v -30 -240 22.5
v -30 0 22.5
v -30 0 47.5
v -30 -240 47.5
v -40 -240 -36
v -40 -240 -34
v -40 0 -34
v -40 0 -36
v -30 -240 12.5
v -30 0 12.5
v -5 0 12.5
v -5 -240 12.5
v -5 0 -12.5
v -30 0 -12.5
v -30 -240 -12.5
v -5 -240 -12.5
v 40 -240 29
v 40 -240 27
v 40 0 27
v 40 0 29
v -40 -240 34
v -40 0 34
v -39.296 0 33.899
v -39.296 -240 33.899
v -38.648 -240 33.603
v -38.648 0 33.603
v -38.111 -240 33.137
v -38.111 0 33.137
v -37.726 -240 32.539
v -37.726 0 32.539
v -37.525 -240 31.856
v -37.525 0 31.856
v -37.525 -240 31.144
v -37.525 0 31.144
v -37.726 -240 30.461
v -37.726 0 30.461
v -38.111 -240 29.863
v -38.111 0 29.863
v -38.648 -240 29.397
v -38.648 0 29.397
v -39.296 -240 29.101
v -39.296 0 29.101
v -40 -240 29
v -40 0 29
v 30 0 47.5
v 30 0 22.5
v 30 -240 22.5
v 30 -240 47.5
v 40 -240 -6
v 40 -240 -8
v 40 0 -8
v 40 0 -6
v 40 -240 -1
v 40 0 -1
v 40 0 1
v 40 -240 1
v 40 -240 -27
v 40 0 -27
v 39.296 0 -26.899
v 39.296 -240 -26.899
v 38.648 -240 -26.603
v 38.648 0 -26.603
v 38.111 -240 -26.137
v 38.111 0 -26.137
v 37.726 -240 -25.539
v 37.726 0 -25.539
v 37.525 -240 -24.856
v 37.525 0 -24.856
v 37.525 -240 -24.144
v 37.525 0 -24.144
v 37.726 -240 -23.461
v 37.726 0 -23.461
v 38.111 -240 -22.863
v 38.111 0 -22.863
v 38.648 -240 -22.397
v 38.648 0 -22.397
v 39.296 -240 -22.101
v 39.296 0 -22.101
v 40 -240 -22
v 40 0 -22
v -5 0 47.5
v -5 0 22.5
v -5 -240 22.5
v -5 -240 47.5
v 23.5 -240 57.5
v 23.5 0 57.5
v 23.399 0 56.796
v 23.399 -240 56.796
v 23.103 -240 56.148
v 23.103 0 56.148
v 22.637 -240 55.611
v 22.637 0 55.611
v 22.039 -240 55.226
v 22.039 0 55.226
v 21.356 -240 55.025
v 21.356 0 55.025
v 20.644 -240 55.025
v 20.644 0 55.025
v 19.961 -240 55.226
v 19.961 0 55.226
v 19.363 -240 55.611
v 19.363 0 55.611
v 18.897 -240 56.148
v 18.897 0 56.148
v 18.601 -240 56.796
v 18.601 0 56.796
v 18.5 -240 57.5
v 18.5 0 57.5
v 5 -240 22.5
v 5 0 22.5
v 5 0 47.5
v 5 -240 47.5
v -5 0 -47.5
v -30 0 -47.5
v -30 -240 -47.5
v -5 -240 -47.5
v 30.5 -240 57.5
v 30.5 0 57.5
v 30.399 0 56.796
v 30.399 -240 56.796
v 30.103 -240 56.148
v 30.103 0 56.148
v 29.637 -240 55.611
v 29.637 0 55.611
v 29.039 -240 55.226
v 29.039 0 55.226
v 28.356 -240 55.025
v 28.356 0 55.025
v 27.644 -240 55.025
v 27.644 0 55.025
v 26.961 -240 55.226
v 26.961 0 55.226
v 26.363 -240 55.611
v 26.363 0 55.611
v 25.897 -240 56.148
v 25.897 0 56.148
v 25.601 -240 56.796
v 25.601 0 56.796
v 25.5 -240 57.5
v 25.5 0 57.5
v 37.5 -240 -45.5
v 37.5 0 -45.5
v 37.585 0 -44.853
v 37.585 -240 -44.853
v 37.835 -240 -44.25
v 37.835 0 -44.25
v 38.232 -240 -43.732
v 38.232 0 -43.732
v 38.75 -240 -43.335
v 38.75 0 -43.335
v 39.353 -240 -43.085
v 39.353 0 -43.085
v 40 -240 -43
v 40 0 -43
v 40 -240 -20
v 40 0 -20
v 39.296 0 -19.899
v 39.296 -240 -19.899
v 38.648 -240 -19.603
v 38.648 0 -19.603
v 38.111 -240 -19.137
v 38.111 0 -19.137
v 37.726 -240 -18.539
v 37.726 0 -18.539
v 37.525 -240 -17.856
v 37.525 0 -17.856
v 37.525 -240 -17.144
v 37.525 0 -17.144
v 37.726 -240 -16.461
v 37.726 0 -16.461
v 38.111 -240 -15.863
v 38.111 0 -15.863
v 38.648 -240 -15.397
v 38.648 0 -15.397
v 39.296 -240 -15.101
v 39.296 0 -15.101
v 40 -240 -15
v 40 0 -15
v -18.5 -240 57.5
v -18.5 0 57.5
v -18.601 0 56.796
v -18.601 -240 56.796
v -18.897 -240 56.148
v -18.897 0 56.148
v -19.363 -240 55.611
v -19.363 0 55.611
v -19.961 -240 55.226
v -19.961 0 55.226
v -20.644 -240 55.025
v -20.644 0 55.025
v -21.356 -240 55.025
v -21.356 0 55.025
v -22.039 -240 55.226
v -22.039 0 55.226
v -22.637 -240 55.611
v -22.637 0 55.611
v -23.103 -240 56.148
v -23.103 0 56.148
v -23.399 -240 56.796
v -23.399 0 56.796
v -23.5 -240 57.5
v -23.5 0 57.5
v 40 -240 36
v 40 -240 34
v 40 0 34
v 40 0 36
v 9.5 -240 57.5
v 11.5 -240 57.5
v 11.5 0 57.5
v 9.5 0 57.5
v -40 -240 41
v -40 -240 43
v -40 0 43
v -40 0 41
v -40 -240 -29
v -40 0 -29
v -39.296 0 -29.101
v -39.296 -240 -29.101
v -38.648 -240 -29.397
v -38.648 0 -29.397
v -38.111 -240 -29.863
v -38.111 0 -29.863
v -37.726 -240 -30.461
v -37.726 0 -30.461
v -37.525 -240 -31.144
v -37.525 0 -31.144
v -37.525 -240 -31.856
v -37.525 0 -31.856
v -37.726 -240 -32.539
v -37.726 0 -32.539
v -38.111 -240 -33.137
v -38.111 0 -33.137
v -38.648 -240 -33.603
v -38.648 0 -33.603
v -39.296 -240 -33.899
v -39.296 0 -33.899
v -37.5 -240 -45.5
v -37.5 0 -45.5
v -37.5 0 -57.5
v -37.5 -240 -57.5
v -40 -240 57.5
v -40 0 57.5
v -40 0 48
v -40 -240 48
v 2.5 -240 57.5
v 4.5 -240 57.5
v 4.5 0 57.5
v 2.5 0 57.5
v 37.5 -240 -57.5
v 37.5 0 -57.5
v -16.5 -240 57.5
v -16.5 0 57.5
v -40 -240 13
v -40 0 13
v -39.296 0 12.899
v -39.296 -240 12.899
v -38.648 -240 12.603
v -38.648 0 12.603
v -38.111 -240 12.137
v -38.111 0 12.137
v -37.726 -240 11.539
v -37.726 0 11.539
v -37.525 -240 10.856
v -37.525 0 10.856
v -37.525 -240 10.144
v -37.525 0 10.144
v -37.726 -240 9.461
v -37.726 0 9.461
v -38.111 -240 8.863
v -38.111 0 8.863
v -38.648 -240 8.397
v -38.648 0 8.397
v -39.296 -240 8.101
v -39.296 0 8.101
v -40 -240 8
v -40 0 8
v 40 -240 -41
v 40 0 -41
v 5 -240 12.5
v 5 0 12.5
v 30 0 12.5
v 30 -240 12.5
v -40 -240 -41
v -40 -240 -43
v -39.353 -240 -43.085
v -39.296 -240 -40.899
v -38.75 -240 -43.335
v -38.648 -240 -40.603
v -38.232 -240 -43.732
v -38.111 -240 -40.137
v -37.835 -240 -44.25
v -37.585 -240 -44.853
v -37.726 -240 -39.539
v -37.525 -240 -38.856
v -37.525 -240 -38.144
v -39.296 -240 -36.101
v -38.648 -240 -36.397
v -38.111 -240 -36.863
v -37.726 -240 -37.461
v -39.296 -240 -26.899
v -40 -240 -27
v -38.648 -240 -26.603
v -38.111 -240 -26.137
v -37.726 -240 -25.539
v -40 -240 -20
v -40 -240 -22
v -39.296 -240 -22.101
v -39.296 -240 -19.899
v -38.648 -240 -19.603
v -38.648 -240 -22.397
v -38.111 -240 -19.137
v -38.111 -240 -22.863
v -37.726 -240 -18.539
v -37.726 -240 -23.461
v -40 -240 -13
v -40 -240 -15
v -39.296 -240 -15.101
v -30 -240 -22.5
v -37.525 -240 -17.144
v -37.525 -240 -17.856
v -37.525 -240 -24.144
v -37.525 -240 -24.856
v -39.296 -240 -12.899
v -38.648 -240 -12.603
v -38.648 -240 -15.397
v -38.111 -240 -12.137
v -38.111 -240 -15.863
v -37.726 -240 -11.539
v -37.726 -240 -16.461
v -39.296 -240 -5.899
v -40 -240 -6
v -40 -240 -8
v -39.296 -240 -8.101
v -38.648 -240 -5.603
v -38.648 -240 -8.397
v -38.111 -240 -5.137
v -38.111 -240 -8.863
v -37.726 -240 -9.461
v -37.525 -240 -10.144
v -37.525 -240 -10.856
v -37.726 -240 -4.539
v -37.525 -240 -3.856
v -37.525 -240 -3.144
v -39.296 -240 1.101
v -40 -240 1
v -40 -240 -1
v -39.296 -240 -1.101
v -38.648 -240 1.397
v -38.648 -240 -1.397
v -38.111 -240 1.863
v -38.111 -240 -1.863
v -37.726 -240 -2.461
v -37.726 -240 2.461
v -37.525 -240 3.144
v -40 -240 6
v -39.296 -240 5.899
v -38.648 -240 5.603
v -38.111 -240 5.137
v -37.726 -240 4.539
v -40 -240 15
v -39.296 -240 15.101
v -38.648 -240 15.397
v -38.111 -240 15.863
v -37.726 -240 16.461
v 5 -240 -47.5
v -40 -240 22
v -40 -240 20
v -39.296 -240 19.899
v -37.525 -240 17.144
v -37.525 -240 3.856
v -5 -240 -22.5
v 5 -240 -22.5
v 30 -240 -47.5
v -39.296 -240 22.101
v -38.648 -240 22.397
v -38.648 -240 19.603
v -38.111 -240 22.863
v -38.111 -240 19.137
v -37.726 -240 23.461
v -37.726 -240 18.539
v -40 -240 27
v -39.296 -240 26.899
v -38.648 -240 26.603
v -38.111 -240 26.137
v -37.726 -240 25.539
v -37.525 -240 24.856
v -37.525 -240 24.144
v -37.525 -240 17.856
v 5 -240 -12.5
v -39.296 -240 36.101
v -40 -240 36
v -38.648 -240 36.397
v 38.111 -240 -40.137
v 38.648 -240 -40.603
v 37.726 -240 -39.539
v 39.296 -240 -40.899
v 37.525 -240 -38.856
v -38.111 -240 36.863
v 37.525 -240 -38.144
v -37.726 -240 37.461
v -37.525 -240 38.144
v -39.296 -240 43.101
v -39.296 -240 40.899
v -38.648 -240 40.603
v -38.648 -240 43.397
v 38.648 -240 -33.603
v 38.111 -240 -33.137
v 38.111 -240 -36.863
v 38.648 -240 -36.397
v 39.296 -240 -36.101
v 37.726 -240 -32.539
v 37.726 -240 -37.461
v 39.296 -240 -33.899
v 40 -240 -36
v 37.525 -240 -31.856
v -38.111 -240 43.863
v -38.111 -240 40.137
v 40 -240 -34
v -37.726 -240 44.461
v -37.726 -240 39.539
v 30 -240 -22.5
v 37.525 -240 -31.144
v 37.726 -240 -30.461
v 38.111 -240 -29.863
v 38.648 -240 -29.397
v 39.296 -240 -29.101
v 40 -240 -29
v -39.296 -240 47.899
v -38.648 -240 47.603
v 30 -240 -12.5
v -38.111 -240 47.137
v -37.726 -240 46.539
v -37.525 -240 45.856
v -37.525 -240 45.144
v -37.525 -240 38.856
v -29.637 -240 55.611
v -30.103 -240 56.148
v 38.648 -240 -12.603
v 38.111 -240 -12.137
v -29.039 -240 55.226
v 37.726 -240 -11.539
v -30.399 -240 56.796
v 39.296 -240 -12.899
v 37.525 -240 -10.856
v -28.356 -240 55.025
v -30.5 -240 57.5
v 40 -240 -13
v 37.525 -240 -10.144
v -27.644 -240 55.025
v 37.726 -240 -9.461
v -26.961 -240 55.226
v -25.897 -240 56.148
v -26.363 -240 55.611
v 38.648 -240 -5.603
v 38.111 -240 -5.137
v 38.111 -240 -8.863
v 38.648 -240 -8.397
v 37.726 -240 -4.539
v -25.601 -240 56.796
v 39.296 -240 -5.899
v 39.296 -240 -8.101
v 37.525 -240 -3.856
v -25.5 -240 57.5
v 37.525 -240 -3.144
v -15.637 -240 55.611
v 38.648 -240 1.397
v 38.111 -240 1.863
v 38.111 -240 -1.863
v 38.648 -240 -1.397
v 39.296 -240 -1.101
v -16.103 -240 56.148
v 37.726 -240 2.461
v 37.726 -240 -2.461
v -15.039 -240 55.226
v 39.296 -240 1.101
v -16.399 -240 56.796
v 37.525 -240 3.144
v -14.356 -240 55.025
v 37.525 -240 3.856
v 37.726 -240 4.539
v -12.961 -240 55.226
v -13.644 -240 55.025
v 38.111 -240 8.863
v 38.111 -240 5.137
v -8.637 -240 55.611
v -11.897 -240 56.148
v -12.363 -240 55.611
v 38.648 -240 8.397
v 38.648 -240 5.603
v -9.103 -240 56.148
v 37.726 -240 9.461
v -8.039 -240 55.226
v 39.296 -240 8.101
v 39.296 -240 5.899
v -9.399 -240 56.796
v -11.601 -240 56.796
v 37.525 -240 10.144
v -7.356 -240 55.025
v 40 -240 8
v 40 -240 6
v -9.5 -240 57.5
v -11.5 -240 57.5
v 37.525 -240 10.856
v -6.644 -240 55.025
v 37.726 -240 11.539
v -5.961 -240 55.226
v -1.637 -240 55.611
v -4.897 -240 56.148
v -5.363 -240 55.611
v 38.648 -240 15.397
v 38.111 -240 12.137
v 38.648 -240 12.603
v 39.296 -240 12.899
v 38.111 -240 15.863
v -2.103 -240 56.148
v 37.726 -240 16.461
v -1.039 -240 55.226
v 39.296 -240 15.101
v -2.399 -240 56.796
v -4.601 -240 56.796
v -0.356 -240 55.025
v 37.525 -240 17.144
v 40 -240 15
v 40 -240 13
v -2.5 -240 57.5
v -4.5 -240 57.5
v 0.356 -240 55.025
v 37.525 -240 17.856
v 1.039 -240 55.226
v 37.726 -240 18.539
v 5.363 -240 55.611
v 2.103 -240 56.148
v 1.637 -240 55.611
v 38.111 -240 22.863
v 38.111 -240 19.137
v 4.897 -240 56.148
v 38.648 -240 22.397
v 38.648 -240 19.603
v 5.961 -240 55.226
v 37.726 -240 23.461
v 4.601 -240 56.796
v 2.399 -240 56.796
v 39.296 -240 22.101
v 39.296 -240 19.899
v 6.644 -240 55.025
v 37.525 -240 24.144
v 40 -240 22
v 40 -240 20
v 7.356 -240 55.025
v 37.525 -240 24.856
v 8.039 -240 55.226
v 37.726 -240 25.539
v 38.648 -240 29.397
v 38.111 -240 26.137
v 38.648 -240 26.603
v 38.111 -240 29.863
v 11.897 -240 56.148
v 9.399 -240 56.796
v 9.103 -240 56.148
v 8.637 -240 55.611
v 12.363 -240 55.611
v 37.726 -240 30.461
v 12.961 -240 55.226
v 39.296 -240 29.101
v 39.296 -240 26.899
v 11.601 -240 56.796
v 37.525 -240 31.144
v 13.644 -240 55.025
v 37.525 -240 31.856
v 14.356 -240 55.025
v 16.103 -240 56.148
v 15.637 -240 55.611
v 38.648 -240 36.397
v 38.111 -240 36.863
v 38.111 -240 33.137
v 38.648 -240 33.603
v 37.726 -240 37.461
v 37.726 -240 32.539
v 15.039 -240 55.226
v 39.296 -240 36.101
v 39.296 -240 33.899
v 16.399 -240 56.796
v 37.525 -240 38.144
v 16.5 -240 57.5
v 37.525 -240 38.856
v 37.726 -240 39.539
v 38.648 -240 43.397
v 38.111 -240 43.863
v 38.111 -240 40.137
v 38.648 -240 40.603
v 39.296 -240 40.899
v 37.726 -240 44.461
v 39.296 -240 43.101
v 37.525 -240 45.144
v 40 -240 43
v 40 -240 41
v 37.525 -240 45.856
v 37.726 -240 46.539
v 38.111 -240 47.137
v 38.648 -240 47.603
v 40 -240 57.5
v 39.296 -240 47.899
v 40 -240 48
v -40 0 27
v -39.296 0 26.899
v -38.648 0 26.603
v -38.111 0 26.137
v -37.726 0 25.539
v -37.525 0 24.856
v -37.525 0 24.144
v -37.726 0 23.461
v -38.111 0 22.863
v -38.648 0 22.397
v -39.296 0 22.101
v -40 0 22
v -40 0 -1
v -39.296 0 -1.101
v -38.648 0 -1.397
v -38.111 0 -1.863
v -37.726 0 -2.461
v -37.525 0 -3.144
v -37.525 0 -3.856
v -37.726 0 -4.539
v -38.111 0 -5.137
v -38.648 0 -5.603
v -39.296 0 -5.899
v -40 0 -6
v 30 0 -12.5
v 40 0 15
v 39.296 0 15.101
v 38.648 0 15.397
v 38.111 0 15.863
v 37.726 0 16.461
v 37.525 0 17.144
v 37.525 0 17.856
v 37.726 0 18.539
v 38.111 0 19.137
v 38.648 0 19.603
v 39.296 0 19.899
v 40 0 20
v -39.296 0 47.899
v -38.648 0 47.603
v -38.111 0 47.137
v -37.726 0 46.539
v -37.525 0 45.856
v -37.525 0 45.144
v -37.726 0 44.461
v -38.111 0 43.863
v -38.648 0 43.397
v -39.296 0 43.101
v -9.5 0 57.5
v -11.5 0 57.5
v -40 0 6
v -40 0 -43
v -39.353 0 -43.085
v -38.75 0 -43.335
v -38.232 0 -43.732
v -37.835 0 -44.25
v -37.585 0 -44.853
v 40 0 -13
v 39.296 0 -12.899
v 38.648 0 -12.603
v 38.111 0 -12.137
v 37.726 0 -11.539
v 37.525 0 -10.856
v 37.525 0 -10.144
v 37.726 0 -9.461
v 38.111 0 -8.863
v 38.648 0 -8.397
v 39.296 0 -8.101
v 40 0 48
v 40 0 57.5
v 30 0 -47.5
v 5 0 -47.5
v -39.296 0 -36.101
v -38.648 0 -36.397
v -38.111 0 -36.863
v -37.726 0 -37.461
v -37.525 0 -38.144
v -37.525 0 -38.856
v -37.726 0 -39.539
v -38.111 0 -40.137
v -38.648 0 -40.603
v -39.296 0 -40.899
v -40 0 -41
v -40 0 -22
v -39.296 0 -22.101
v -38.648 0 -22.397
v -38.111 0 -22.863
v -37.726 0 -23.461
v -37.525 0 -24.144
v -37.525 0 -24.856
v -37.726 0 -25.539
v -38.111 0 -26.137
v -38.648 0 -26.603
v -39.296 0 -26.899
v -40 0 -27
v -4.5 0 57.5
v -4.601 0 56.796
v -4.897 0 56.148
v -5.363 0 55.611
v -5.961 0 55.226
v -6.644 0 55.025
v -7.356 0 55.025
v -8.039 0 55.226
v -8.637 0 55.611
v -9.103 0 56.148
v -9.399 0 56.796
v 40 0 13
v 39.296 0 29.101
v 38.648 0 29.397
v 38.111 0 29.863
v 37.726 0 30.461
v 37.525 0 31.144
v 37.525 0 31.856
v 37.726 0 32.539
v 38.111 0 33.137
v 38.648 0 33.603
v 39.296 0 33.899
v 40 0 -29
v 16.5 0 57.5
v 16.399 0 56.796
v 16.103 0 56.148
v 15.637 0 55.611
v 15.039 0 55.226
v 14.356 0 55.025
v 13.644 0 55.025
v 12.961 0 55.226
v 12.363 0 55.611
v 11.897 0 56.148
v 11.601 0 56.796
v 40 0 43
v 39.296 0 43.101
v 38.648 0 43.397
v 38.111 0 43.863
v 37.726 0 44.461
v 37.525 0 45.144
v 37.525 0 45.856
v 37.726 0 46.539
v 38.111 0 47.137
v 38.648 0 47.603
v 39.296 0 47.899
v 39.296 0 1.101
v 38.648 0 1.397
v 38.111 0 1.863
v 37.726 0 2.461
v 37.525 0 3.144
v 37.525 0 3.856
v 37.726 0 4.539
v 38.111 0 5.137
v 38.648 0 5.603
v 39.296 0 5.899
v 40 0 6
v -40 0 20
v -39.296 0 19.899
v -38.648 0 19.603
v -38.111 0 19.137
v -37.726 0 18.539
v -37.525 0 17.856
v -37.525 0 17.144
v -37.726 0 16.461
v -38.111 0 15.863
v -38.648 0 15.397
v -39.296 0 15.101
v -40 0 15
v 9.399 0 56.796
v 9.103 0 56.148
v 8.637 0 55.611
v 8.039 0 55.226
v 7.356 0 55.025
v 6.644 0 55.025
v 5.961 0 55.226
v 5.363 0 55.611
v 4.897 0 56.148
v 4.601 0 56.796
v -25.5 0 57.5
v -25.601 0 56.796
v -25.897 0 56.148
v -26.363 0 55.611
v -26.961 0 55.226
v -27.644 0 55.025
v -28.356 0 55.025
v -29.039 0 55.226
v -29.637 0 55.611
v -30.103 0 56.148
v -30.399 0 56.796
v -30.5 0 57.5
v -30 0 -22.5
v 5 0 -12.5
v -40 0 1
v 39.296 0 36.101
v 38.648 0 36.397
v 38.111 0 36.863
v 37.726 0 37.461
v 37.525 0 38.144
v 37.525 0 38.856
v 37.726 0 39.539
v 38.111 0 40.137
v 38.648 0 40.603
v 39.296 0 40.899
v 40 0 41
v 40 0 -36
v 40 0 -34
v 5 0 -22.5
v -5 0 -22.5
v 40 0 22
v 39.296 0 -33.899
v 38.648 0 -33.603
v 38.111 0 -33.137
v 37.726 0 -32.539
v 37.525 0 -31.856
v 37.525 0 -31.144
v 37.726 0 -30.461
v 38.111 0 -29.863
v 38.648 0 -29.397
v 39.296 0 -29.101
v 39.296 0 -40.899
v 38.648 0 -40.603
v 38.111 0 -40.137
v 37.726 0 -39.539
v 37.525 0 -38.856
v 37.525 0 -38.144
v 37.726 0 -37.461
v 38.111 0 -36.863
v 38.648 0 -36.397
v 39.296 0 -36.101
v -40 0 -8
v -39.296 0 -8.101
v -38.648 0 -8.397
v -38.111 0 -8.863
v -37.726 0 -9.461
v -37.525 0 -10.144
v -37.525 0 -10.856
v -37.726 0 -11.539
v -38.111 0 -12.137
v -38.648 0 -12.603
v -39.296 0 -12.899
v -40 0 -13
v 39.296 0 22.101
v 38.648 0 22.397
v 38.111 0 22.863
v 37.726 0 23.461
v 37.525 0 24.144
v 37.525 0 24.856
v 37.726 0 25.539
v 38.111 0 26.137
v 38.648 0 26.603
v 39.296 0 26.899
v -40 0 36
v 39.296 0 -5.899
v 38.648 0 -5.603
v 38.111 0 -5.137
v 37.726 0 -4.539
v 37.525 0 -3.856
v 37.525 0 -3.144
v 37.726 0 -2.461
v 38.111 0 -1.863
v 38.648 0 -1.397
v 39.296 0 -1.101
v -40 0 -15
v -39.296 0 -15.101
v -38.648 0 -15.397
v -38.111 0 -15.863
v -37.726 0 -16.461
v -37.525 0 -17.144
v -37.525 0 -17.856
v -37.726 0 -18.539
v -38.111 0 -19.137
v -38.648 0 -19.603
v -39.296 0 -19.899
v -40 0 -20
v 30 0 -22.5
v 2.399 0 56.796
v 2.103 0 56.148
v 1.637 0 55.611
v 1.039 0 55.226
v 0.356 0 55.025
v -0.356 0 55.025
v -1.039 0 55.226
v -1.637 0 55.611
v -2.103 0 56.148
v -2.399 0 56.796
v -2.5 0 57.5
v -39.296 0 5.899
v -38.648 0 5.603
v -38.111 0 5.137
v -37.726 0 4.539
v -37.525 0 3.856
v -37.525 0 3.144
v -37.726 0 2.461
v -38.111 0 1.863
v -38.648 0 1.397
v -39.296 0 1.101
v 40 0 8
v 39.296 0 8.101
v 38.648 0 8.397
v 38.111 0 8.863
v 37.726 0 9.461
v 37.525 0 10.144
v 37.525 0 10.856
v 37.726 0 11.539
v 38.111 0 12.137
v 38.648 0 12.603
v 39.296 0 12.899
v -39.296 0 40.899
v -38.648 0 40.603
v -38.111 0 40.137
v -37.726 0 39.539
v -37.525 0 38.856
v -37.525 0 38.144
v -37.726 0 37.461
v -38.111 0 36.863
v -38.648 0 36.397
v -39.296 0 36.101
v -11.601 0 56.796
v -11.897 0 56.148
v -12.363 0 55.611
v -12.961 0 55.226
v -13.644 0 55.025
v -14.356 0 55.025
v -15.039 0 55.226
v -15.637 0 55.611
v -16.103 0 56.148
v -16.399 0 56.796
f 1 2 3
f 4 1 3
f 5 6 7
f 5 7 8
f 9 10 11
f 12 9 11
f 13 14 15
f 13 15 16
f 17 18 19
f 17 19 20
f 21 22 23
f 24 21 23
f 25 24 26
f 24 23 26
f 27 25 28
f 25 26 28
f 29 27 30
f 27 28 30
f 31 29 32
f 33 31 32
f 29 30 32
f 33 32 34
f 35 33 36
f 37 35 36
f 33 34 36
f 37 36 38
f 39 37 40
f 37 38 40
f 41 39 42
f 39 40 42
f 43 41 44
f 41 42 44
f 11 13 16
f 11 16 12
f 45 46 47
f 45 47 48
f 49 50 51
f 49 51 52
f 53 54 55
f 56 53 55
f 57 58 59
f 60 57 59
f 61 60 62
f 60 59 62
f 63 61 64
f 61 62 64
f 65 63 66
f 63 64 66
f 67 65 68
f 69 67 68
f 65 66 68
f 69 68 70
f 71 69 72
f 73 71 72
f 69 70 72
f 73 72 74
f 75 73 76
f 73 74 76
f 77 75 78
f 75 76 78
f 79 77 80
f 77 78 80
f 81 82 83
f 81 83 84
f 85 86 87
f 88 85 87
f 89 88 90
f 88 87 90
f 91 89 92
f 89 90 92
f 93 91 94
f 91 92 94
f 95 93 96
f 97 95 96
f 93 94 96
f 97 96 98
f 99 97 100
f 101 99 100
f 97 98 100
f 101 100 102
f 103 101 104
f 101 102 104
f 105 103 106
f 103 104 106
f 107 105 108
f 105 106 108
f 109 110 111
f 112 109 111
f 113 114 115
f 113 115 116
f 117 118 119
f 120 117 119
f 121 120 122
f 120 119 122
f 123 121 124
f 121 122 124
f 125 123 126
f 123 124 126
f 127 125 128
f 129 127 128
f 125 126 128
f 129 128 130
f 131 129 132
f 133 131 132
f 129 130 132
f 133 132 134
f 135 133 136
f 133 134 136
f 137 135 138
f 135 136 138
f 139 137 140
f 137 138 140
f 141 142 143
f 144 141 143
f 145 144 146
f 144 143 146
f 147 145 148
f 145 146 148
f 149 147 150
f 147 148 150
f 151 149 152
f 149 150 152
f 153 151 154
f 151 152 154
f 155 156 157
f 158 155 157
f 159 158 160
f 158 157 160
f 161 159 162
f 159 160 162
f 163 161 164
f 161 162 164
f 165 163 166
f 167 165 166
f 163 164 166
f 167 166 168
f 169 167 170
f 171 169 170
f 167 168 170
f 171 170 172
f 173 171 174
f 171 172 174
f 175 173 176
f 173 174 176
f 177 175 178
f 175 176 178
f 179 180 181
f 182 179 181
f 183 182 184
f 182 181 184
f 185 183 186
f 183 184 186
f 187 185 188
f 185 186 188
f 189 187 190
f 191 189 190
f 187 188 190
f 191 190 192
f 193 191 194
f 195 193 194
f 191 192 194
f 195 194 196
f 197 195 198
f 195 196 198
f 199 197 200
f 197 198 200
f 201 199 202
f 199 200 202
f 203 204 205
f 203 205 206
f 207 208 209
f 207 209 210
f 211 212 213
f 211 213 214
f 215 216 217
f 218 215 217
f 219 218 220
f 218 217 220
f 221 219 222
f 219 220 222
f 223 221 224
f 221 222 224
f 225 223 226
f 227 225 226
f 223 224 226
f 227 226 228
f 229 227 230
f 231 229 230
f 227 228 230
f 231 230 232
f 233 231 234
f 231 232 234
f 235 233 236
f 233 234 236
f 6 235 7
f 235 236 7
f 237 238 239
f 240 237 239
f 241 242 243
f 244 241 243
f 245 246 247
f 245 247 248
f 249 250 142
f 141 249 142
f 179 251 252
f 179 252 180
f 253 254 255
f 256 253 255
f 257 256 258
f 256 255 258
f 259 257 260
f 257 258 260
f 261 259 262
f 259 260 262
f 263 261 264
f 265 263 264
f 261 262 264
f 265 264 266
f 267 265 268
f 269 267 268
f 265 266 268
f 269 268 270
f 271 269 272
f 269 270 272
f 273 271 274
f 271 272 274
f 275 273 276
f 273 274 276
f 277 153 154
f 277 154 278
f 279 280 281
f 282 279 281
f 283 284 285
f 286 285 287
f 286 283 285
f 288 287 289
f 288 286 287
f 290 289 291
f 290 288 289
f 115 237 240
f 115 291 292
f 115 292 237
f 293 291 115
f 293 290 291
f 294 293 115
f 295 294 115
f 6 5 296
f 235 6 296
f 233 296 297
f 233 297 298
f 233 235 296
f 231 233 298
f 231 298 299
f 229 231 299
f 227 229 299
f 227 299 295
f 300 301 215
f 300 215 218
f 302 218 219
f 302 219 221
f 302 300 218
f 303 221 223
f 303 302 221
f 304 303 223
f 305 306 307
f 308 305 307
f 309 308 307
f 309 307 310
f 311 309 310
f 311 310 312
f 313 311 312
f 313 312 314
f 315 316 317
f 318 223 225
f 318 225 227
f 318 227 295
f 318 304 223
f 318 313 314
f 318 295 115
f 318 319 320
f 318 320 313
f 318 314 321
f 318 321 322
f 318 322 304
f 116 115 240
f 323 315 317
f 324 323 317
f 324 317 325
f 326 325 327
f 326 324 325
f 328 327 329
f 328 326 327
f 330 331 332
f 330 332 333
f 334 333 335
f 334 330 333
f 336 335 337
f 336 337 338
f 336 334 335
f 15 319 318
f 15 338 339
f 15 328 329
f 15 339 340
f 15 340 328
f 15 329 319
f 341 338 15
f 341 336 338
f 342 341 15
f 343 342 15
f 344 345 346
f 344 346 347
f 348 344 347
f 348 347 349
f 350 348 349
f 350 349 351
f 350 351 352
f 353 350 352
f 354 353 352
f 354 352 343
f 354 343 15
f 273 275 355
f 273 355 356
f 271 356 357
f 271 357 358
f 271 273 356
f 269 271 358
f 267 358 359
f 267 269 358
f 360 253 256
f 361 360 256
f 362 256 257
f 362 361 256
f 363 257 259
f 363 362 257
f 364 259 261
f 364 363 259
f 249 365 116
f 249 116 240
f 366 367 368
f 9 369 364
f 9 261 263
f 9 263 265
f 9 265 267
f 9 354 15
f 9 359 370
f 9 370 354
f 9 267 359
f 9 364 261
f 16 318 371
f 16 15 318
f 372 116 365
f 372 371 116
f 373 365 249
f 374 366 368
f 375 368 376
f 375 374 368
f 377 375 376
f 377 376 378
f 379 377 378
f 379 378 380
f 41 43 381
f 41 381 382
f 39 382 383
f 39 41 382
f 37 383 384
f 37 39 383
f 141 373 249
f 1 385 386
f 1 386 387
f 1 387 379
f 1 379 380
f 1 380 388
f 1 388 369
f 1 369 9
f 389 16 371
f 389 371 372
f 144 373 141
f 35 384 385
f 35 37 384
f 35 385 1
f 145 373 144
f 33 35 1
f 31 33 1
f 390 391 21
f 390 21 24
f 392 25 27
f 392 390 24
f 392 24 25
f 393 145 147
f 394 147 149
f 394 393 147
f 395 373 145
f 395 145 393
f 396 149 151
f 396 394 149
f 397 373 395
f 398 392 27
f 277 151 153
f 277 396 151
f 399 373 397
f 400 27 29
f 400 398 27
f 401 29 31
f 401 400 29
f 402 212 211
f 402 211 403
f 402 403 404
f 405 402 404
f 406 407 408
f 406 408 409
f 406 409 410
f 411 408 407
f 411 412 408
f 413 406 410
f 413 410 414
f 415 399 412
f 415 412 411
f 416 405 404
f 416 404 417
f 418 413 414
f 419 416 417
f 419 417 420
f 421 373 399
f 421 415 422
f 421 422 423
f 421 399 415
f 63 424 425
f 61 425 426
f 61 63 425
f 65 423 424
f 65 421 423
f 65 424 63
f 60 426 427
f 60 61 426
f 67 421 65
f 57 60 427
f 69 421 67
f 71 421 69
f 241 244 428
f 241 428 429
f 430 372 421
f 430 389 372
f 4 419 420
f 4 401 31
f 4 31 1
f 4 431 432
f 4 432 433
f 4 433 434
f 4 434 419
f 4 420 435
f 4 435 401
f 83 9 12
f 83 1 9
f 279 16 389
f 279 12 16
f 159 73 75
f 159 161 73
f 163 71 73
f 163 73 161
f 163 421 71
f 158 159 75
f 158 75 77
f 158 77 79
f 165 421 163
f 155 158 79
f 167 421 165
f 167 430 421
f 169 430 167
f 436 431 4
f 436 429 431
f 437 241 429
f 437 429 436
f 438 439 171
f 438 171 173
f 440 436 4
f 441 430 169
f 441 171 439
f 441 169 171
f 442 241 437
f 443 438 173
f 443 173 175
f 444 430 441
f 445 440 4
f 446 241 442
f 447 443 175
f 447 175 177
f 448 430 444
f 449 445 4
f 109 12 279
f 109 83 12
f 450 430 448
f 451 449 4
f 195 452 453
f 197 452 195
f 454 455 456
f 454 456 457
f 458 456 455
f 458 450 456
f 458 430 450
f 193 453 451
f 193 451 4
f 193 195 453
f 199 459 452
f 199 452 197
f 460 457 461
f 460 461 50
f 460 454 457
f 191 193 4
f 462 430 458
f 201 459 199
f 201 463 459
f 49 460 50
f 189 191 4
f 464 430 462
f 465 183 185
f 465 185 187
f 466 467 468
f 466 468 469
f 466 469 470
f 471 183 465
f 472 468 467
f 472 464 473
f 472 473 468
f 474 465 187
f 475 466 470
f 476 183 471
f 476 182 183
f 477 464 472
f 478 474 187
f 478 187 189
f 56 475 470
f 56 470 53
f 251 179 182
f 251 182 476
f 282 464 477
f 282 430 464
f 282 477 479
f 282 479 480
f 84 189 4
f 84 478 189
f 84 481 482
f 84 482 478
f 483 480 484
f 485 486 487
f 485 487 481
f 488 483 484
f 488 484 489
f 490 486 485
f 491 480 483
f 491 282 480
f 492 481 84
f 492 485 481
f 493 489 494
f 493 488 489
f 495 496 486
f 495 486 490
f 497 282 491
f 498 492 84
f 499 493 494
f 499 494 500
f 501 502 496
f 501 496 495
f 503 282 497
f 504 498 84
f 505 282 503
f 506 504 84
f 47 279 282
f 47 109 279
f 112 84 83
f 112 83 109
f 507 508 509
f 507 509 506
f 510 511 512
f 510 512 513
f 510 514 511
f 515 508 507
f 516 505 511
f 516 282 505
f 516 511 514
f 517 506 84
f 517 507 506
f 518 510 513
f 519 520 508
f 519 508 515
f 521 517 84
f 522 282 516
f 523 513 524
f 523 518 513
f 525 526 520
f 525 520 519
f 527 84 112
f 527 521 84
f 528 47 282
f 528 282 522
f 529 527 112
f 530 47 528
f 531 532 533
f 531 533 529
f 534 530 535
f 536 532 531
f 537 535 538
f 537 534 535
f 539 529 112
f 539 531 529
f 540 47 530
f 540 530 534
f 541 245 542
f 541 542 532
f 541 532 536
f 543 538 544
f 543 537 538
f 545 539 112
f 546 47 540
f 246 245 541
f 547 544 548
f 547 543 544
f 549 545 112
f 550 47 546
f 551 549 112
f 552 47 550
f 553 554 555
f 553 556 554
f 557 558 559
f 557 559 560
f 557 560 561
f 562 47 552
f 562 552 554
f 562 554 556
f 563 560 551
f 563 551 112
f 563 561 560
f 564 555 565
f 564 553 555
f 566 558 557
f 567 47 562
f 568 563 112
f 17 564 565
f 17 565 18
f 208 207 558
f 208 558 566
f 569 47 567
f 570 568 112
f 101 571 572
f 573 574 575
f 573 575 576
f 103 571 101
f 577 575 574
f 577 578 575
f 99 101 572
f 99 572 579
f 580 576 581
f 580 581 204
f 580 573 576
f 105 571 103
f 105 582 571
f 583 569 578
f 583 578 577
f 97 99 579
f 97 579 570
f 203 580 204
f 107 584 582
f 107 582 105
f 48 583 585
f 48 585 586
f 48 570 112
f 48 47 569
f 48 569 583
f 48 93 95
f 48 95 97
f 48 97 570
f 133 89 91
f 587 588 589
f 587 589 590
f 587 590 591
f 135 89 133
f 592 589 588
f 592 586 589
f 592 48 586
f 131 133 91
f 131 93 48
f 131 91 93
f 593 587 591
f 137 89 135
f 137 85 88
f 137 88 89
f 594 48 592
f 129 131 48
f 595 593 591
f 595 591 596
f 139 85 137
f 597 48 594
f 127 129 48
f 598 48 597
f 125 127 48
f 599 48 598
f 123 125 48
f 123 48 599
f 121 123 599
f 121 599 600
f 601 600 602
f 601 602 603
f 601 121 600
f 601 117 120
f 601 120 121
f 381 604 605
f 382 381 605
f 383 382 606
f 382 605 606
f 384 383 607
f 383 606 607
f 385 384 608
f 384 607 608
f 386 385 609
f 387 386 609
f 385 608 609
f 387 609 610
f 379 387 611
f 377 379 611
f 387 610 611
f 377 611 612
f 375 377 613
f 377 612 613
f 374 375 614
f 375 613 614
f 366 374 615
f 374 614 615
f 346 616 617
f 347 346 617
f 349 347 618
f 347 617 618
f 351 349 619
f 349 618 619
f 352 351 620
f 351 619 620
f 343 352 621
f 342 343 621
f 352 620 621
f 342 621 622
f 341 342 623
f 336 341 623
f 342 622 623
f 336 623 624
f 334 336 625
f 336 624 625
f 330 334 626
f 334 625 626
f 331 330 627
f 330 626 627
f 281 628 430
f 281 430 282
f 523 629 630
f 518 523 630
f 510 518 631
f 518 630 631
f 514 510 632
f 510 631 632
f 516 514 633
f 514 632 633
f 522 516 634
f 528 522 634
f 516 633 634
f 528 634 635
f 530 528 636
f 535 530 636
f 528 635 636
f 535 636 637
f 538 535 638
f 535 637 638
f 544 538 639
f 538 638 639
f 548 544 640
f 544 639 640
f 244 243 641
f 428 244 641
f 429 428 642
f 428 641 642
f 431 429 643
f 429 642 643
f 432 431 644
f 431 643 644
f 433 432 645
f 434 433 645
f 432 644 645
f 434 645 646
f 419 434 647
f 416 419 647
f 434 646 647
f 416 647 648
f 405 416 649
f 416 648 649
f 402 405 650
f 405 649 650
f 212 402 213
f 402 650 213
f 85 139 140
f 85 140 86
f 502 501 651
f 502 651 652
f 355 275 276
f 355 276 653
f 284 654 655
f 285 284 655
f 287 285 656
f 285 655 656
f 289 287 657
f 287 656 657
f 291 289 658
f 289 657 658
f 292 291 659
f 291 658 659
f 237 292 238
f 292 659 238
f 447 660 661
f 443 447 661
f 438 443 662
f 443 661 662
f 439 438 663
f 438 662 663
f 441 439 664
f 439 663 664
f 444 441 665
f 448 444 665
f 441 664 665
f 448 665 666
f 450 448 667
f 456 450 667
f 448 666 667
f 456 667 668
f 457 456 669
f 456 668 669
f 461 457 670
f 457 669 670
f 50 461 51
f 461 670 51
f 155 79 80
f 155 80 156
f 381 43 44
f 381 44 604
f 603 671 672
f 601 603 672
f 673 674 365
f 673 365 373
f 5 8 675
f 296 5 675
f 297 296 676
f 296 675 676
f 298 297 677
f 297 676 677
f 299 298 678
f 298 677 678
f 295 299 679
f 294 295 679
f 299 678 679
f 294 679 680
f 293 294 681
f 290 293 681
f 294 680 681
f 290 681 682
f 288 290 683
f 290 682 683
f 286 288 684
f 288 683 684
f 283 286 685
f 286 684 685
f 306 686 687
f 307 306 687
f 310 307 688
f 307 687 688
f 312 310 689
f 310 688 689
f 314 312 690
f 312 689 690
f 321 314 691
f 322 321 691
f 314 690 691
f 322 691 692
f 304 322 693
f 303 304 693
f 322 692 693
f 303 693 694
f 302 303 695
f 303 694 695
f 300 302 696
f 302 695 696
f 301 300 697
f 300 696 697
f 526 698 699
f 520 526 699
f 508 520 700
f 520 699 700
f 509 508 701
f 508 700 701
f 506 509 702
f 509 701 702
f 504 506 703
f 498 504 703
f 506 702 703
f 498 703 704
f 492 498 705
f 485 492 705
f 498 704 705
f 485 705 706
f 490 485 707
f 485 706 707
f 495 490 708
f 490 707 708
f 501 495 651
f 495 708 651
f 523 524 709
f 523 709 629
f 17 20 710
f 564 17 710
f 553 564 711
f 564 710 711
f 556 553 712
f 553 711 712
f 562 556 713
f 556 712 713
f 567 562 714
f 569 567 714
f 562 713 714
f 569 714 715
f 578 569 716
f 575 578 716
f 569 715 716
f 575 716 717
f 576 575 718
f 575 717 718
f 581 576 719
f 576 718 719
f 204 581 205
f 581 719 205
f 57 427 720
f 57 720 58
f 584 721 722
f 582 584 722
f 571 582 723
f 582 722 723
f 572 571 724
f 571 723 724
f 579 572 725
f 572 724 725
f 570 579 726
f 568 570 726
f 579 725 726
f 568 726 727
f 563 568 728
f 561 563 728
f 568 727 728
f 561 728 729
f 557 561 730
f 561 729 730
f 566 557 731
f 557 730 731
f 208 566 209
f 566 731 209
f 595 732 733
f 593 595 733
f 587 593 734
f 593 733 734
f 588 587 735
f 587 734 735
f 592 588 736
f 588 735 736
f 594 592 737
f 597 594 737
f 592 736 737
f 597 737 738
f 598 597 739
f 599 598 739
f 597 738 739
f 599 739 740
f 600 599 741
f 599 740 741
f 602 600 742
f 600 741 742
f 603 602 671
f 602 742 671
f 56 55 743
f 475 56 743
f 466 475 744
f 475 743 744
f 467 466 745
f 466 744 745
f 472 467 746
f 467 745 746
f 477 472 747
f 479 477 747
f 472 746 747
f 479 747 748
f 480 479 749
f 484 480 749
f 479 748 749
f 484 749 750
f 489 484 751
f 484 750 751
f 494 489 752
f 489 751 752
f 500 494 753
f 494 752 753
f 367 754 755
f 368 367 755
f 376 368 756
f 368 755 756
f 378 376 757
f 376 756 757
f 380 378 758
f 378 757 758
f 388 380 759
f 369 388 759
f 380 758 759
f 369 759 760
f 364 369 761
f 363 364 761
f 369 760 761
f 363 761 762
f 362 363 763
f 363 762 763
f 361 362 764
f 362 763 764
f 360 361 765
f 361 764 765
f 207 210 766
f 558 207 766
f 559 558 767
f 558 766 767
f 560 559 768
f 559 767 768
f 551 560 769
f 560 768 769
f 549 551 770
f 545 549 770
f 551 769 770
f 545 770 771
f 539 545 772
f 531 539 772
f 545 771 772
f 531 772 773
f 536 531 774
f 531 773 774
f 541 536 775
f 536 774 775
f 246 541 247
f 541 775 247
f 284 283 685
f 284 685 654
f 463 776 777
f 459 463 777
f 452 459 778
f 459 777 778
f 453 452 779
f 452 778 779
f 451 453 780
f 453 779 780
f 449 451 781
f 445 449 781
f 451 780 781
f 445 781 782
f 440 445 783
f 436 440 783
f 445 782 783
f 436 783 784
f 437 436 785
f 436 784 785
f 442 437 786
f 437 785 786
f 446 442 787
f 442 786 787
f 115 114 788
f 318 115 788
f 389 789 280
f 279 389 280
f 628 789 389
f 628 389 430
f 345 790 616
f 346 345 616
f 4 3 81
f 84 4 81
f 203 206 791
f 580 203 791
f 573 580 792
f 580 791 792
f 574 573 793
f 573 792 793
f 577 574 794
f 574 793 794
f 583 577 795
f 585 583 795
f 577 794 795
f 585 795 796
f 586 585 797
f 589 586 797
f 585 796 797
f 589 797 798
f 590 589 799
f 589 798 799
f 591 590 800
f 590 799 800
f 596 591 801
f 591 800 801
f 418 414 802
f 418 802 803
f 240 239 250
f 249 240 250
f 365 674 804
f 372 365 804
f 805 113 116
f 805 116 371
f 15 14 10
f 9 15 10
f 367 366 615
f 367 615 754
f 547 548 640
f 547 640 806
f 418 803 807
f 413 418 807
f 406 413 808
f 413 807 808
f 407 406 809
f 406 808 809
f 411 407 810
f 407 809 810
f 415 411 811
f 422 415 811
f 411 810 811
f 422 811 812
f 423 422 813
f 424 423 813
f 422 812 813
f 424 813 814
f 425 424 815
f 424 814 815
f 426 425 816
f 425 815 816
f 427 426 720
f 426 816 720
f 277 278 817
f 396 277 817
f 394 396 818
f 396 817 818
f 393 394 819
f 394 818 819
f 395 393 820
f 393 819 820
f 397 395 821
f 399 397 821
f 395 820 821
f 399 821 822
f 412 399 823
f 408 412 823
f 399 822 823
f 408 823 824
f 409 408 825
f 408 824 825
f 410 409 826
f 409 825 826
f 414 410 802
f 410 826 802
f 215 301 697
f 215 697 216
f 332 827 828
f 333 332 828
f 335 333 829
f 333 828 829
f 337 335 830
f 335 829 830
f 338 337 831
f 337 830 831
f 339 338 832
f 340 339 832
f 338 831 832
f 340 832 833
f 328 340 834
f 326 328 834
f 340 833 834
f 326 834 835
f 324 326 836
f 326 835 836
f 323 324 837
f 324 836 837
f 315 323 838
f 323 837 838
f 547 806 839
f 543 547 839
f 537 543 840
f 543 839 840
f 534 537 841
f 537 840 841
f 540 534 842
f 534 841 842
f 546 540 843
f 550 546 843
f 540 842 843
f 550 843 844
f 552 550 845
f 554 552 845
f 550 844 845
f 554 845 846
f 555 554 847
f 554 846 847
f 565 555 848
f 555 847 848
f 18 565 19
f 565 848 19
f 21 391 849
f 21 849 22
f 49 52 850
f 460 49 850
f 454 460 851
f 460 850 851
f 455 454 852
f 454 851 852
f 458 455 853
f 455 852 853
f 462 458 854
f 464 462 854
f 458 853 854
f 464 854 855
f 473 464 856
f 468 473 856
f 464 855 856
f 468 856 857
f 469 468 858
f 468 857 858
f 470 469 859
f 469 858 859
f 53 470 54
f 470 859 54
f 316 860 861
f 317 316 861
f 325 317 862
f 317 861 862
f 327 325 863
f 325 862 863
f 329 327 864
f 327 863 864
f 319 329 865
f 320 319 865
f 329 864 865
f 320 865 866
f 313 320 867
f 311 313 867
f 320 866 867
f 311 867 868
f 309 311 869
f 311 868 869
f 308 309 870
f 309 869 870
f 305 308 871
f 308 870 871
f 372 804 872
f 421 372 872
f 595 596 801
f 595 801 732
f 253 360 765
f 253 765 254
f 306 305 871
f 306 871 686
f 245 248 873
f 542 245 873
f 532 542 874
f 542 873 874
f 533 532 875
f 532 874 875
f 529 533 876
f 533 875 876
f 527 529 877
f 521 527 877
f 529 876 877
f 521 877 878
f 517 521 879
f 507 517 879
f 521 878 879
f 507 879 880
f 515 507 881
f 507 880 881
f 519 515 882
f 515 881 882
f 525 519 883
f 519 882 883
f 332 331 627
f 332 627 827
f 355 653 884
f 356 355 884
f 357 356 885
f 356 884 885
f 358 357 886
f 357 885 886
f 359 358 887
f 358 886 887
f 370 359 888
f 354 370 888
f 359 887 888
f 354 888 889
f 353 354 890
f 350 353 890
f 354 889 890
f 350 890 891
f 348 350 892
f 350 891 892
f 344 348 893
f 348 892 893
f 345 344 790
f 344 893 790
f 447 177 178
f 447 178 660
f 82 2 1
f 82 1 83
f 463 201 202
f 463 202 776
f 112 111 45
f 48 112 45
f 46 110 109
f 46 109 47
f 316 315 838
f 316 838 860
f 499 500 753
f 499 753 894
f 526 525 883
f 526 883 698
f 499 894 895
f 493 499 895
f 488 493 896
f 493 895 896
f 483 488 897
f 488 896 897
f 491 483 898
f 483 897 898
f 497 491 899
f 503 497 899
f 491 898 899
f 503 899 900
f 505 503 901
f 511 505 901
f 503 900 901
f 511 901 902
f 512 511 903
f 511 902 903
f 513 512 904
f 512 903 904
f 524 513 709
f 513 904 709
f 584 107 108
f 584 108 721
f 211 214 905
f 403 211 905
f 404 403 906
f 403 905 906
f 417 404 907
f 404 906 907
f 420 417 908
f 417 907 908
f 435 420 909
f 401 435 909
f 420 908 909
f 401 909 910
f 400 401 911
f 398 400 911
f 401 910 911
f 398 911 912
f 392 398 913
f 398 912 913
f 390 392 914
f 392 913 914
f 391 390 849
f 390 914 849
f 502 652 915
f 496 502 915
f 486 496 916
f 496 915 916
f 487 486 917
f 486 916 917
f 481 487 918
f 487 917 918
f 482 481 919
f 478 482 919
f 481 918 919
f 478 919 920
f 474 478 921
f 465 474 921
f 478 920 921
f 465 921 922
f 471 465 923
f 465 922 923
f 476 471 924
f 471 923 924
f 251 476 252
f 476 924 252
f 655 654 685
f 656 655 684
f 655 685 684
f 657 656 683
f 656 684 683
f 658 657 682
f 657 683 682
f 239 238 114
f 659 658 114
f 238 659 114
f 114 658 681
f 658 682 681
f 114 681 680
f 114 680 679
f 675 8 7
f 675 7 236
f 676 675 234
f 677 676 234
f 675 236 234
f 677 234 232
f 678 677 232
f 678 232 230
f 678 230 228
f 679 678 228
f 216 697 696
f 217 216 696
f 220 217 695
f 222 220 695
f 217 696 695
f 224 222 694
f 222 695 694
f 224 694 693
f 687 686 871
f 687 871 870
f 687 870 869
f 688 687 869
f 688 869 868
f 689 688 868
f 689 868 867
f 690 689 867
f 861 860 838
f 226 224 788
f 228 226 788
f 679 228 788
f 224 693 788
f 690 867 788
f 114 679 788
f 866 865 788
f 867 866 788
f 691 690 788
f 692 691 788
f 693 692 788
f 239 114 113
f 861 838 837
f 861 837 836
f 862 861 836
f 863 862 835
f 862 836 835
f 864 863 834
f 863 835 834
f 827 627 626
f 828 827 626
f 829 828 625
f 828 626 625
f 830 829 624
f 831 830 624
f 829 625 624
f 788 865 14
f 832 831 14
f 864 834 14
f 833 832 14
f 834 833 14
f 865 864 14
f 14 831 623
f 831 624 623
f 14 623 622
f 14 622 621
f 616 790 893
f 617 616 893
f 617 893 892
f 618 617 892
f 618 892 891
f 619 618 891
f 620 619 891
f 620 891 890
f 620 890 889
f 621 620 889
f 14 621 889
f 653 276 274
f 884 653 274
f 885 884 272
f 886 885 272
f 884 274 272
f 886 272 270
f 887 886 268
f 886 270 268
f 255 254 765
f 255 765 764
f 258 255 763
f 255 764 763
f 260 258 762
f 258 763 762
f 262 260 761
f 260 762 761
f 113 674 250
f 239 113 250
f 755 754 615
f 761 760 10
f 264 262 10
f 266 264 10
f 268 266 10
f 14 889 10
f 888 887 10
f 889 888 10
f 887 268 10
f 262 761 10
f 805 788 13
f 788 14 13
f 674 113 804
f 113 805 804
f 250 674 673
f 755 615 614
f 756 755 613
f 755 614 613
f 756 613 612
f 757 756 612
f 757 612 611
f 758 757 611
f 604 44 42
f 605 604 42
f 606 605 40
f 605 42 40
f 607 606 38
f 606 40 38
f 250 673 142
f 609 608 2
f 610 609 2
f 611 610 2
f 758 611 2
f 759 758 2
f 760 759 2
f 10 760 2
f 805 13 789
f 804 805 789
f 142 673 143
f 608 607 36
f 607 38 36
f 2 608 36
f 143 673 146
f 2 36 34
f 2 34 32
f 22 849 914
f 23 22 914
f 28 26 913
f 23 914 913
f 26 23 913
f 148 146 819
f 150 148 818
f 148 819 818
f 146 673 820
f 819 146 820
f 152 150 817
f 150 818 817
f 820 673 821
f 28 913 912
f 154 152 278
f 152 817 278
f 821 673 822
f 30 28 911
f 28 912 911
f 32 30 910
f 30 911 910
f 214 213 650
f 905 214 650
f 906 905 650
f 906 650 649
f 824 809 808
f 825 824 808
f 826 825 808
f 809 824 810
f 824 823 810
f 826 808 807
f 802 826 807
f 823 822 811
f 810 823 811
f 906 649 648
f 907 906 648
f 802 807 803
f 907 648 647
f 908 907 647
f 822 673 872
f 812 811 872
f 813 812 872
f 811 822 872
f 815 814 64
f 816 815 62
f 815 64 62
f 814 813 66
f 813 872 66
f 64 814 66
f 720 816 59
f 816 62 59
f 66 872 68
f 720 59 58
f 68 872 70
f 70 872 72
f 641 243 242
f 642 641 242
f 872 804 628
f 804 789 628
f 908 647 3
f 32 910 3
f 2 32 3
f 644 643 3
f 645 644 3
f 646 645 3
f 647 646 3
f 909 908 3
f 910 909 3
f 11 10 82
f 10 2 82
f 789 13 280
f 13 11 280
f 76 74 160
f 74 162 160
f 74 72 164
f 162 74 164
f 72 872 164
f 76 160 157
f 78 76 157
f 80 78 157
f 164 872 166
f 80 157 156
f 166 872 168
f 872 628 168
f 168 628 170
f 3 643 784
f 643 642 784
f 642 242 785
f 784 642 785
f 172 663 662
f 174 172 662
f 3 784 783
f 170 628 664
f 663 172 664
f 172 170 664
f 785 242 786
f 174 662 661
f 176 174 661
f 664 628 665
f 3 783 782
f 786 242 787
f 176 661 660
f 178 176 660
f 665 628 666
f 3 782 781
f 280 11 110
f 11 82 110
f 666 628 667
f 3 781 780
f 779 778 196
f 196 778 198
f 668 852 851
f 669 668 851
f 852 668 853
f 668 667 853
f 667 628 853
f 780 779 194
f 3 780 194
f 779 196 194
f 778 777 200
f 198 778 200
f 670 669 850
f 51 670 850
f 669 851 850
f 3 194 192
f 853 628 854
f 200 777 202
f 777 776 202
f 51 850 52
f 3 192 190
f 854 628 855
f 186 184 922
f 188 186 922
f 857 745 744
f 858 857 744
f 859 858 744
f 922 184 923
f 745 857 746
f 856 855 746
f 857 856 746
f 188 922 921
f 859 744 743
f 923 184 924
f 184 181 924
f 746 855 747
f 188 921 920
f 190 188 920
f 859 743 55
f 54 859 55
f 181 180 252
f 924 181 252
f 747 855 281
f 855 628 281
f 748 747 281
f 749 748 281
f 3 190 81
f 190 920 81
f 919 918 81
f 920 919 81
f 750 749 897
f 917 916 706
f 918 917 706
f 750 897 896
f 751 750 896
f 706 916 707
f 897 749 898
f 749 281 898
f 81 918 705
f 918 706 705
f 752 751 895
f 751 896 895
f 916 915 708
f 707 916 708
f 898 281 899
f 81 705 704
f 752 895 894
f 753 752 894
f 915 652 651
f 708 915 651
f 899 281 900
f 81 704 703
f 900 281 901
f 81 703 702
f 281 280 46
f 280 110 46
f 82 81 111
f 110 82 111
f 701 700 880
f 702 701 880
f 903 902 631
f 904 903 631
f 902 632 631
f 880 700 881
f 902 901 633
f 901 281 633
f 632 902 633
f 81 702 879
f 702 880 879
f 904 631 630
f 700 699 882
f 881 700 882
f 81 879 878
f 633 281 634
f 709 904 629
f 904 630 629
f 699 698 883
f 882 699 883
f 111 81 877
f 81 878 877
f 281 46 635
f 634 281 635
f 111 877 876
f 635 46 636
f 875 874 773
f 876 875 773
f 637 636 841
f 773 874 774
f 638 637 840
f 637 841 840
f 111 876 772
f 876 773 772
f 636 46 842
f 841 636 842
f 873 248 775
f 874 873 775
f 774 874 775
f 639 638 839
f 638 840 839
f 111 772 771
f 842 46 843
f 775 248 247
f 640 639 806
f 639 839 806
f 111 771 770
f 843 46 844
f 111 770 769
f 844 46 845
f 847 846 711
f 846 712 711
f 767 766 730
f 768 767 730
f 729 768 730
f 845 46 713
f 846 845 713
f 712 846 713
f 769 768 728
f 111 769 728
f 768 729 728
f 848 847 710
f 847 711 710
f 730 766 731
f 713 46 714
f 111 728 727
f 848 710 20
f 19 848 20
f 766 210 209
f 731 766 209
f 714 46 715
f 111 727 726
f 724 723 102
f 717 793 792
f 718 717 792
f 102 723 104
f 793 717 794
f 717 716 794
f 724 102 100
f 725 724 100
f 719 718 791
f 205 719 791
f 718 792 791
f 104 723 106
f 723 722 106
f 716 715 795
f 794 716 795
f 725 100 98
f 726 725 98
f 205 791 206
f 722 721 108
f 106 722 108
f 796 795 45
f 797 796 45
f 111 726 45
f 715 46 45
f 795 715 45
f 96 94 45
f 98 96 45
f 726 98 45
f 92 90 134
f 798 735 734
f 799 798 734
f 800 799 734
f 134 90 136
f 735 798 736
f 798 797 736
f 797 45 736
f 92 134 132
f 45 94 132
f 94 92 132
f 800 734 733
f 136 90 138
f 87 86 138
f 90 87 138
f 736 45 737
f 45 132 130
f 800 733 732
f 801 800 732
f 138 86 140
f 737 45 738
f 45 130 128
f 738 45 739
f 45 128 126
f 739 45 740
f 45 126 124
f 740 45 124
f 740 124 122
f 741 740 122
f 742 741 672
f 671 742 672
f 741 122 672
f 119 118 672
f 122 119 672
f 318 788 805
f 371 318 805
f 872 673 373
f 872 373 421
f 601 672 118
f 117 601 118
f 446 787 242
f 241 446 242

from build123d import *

# Parameters (mm, degrees)
F0_W     = 25
F0_H     = 25
F1_DEPTH = 240


with BuildPart() as f1:
    # F0 (on Front) → F1 (new body)
    with BuildSketch(Plane.XZ):
        with BuildLine():
            Line((-37.5, -45.5), (-37.5, -57.5))
            Line((-37.5, -57.5), (37.5, -57.5))
            Line((37.5, -57.5), (37.5, -45.5))
            ThreePointArc((37.5, -45.5), (38.232233, -43.732233), (40, -43))
            Line((40, -43), (40, -41))
            ThreePointArc((40, -41), (37.5, -38.5), (40, -36))
            Line((40, -36), (40, -34))
            ThreePointArc((40, -34), (37.5, -31.5), (40, -29))
            Line((40, -29), (40, -27))
            ThreePointArc((40, -27), (37.5, -24.5), (40, -22))
            Line((40, -22), (40, -20))
            ThreePointArc((40, -20), (37.5, -17.5), (40, -15))
            Line((40, -15), (40, -13))
            ThreePointArc((40, -13), (37.5, -10.5), (40, -8))
            Line((40, -8), (40, -6))
            ThreePointArc((40, -6), (37.5, -3.5), (40, -1))
            Line((40, -1), (40, 1))
            ThreePointArc((40, 1), (37.5, 3.5), (40, 6))
            Line((40, 6), (40, 8))
            ThreePointArc((40, 8), (37.5, 10.5), (40, 13))
            Line((40, 13), (40, 15))
            ThreePointArc((40, 15), (37.5, 17.5), (40, 20))
            Line((40, 20), (40, 22))
            ThreePointArc((40, 22), (37.5, 24.5), (40, 27))
            Line((40, 27), (40, 29))
            ThreePointArc((40, 29), (37.5, 31.5), (40, 34))
            Line((40, 34), (40, 36))
            ThreePointArc((40, 36), (37.5, 38.5), (40, 41))
            Line((40, 41), (40, 43))
            ThreePointArc((40, 43), (37.5, 45.5), (40, 48))
            Line((40, 48), (40, 57.5))
            Line((40, 57.5), (30.5, 57.5))
            ThreePointArc((30.5, 57.5), (28, 55), (25.5, 57.5))
            Line((25.5, 57.5), (23.5, 57.5))
            ThreePointArc((23.5, 57.5), (21, 55), (18.5, 57.5))
            Line((18.5, 57.5), (16.5, 57.5))
            ThreePointArc((16.5, 57.5), (14, 55), (11.5, 57.5))
            Line((11.5, 57.5), (9.5, 57.5))
            ThreePointArc((9.5, 57.5), (7, 55), (4.5, 57.5))
            Line((4.5, 57.5), (2.5, 57.5))
            ThreePointArc((2.5, 57.5), (0, 55), (-2.5, 57.5))
            Line((-2.5, 57.5), (-4.5, 57.5))
            ThreePointArc((-4.5, 57.5), (-7, 55), (-9.5, 57.5))
            Line((-9.5, 57.5), (-11.5, 57.5))
            ThreePointArc((-11.5, 57.5), (-14, 55), (-16.5, 57.5))
            Line((-16.5, 57.5), (-18.5, 57.5))
            ThreePointArc((-18.5, 57.5), (-21, 55), (-23.5, 57.5))
            Line((-23.5, 57.5), (-25.5, 57.5))
            ThreePointArc((-25.5, 57.5), (-28, 55), (-30.5, 57.5))
            Line((-30.5, 57.5), (-40, 57.5))
            Line((-40, 57.5), (-40, 48))
            ThreePointArc((-40, 48), (-37.5, 45.5), (-40, 43))
            Line((-40, 43), (-40, 41))
            ThreePointArc((-40, 41), (-37.5, 38.5), (-40, 36))
            Line((-40, 36), (-40, 34))
            ThreePointArc((-40, 34), (-37.5, 31.5), (-40, 29))
            Line((-40, 29), (-40, 27))
            ThreePointArc((-40, 27), (-37.5, 24.5), (-40, 22))
            Line((-40, 22), (-40, 20))
            ThreePointArc((-40, 20), (-37.5, 17.5), (-40, 15))
            Line((-40, 15), (-40, 13))
            ThreePointArc((-40, 13), (-37.5, 10.5), (-40, 8))
            Line((-40, 8), (-40, 6))
            ThreePointArc((-40, 6), (-37.5, 3.5), (-40, 1))
            Line((-40, 1), (-40, -1))
            ThreePointArc((-40, -1), (-37.5, -3.5), (-40, -6))
            Line((-40, -6), (-40, -8))
            ThreePointArc((-40, -8), (-37.5, -10.5), (-40, -13))
            Line((-40, -13), (-40, -15))
            ThreePointArc((-40, -15), (-37.5, -17.5), (-40, -20))
            Line((-40, -20), (-40, -22))
            ThreePointArc((-40, -22), (-37.5, -24.5), (-40, -27))
            Line((-40, -27), (-40, -29))
            ThreePointArc((-40, -29), (-37.5, -31.5), (-40, -34))
            Line((-40, -34), (-40, -36))
            ThreePointArc((-40, -36), (-37.5, -38.5), (-40, -41))
            Line((-40, -41), (-40, -43))
            ThreePointArc((-40, -43), (-38.232233, -43.732233), (-37.5, -45.5))
        make_face()
        with Locations((-17.5, -35)):
            Rectangle(F0_W, F0_H, mode=Mode.SUBTRACT)
        with Locations((17.5, -35)):
            Rectangle(F0_W, F0_H, mode=Mode.SUBTRACT)
        with Locations((-17.5, 0)):
            Rectangle(F0_W, F0_H, mode=Mode.SUBTRACT)
        with Locations((-17.5, 35)):
            Rectangle(F0_W, F0_H, mode=Mode.SUBTRACT)
        with Locations((17.5, 0)):
            Rectangle(F0_W, F0_H, mode=Mode.SUBTRACT)
        with Locations((17.5, 35)):
            Rectangle(F0_W, F0_H, mode=Mode.SUBTRACT)
    extrude(amount=F1_DEPTH)


solid = f1.part
